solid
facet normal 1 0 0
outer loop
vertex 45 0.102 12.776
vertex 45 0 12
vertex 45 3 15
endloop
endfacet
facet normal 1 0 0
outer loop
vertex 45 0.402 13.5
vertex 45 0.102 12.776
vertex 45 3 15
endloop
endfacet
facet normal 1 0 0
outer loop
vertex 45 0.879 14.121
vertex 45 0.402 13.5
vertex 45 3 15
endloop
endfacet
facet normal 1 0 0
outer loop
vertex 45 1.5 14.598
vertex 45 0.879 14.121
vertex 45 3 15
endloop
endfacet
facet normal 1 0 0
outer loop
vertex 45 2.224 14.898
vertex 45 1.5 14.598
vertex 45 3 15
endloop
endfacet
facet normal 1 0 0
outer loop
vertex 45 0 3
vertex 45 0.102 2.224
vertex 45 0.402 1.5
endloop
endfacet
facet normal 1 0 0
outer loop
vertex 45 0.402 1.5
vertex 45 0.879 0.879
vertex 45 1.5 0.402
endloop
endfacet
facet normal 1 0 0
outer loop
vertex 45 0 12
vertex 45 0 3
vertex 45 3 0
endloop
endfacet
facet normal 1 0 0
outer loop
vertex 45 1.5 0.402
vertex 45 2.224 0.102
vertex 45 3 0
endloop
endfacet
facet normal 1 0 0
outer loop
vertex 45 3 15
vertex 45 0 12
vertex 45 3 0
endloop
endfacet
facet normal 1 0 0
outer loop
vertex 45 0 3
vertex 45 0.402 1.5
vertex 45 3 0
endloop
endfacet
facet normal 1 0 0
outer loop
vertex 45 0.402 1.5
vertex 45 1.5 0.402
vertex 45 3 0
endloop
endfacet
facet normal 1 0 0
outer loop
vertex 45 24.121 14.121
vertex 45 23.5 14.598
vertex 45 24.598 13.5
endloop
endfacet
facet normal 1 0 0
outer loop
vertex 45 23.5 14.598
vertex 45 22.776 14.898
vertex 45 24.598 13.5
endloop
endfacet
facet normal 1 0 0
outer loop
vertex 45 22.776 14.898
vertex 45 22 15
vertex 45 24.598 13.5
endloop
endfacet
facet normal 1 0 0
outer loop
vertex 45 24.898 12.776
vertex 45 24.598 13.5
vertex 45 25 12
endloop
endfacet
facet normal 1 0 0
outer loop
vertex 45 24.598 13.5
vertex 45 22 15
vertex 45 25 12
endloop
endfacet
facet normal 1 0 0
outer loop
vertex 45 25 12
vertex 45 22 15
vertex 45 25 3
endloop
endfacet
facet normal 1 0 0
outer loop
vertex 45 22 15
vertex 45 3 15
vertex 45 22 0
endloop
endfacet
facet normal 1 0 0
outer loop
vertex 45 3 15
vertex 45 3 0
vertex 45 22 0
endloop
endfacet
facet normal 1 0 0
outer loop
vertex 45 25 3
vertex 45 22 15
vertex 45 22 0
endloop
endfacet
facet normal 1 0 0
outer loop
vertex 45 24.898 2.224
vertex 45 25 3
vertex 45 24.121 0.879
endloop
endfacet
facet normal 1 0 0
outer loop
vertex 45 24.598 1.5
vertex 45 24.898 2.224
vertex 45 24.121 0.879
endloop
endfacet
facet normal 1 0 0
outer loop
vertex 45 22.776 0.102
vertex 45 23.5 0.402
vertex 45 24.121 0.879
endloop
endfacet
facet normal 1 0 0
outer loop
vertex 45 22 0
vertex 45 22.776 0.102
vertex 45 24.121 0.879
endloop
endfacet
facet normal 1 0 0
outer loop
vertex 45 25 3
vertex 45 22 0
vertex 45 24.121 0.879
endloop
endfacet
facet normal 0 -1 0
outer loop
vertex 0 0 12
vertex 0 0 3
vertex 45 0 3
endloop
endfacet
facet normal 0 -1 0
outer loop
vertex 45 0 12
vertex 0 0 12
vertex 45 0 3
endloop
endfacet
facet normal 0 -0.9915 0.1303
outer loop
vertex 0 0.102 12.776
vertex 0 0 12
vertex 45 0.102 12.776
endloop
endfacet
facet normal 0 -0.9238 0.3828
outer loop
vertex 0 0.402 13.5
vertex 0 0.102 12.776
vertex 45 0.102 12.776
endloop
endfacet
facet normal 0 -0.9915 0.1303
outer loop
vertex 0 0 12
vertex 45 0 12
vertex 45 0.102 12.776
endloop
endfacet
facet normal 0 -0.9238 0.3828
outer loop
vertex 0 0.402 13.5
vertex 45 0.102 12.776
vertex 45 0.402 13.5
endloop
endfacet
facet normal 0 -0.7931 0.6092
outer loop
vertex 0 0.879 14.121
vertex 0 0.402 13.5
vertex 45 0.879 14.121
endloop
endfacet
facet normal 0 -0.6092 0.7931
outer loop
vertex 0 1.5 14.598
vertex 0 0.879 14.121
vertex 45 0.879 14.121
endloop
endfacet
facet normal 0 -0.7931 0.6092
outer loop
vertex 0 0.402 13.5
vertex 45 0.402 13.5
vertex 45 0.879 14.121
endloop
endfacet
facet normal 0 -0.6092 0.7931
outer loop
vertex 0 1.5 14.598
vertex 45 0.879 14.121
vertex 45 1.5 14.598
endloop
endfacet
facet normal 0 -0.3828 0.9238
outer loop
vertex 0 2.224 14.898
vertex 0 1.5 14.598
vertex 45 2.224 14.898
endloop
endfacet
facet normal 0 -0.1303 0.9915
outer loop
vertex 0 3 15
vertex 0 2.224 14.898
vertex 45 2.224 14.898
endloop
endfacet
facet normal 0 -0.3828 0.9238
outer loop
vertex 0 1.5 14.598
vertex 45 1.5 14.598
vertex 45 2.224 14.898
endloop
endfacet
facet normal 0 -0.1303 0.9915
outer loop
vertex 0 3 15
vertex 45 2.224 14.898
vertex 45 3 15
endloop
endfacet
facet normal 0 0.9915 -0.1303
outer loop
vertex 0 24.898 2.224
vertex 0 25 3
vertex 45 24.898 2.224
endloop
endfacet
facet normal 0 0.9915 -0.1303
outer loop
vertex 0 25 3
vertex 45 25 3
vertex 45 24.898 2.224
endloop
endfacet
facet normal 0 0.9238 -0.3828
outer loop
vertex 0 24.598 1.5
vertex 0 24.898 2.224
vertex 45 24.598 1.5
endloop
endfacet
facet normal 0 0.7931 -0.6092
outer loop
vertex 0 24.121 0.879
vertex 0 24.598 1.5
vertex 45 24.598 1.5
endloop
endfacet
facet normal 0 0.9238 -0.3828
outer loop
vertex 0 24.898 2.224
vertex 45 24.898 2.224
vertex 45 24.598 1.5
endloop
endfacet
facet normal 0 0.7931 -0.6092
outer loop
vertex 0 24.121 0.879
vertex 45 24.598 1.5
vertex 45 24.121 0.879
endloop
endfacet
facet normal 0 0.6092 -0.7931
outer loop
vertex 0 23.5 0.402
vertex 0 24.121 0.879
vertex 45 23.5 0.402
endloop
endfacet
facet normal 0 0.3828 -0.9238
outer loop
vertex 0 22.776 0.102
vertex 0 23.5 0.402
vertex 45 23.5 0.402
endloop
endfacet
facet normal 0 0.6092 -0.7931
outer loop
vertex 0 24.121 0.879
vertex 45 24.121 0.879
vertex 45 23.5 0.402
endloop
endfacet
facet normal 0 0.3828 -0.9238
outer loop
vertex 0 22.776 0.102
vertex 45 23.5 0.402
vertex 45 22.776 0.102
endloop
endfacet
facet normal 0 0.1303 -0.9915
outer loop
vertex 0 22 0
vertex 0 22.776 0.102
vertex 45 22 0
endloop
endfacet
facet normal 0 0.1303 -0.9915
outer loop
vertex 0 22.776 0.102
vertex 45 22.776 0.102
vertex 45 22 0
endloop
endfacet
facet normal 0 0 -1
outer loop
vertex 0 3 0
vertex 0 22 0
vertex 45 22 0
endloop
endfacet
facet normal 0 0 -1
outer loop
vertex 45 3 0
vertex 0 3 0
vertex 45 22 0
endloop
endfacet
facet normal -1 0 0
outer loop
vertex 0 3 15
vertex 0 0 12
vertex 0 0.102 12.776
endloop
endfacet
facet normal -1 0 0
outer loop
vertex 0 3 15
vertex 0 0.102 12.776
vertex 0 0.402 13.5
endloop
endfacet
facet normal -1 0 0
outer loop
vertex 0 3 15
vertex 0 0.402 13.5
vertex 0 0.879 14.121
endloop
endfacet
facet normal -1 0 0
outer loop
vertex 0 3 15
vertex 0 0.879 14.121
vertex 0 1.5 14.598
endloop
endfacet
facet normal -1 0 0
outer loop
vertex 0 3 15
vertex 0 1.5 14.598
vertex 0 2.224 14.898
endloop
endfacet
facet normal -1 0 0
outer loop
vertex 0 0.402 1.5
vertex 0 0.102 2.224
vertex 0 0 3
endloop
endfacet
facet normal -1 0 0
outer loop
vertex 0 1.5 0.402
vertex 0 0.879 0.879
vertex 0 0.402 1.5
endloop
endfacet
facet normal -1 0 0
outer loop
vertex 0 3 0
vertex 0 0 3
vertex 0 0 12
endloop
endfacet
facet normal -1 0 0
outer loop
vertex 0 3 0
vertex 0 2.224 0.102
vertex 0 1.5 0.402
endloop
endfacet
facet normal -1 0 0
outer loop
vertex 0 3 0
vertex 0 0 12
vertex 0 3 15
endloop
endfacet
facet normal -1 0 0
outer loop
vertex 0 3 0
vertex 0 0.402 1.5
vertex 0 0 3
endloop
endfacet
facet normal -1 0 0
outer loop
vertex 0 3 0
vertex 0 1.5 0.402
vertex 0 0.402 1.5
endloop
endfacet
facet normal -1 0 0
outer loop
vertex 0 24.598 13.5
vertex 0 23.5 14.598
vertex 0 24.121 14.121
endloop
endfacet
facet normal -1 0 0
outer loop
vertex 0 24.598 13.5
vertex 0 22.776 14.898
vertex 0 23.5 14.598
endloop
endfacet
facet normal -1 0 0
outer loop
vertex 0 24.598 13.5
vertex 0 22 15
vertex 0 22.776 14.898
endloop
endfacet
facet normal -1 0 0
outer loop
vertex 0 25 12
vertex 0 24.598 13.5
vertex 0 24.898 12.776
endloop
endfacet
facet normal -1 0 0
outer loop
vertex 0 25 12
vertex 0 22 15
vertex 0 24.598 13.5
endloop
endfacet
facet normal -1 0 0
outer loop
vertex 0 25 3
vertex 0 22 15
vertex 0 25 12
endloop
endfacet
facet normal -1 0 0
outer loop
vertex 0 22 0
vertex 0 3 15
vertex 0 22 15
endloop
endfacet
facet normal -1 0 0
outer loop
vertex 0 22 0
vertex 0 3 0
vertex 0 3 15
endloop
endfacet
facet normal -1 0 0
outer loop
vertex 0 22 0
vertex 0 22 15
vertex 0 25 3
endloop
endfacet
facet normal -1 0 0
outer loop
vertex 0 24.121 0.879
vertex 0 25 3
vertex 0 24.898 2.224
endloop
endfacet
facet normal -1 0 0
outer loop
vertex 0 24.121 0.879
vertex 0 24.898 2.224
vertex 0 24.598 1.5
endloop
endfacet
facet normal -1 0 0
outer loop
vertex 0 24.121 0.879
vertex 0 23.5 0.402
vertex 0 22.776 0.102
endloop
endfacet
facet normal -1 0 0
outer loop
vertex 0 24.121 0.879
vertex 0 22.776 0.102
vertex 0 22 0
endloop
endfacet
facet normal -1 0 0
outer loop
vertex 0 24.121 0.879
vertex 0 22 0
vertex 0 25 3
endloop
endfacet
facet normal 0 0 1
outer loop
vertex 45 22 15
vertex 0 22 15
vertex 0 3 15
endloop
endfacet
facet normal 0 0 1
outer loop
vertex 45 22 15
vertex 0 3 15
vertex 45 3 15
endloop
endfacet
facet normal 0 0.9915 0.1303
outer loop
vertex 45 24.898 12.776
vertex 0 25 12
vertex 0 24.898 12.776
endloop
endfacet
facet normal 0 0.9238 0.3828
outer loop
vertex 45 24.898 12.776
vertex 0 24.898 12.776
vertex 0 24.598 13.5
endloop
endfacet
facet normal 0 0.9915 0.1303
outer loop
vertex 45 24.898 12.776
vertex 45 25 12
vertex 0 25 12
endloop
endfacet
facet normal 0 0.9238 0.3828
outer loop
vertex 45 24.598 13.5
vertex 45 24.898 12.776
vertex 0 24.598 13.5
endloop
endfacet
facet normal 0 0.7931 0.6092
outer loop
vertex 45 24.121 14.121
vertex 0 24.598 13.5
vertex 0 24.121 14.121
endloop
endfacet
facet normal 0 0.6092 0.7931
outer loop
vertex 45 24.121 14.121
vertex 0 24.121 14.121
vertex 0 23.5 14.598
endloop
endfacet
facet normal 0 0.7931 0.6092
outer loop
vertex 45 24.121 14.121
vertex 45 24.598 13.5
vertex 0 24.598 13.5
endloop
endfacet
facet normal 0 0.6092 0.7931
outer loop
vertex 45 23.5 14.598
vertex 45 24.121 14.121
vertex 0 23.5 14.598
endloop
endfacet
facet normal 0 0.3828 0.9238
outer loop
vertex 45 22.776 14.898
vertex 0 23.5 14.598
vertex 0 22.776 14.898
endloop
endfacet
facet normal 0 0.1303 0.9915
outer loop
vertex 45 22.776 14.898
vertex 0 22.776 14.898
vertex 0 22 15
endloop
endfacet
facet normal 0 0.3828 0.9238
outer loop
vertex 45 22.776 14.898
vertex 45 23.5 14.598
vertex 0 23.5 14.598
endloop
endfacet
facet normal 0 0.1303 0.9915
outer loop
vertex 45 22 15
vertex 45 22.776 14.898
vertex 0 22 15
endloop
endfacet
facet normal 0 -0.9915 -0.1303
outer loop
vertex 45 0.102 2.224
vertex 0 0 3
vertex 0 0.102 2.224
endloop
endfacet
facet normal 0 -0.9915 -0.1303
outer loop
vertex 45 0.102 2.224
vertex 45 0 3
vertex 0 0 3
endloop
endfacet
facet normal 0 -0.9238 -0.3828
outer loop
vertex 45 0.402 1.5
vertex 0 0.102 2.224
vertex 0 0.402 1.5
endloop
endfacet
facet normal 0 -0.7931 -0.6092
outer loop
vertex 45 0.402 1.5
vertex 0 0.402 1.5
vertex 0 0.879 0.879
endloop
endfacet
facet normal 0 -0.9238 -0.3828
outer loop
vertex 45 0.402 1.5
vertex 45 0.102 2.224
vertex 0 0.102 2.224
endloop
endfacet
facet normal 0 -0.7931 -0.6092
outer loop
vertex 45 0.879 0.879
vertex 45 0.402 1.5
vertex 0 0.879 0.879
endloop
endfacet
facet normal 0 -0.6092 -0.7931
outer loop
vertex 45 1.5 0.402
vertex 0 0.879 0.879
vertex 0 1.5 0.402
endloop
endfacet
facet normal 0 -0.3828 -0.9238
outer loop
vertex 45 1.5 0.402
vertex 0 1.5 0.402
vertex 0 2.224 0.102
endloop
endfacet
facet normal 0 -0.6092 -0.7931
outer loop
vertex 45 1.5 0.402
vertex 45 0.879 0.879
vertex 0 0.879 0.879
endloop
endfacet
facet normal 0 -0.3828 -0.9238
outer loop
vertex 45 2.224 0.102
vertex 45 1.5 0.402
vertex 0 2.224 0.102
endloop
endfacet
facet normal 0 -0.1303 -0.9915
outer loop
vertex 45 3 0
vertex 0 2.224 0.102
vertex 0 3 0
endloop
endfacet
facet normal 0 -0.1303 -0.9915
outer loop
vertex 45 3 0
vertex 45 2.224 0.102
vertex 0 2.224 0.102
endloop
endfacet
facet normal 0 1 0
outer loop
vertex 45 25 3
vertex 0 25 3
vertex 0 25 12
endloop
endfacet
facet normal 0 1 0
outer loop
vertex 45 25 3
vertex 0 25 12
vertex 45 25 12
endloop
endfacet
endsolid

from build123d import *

# Parameters (mm, degrees)
ESBO_O1_W                = 45
ESBO_O1_H                = 25
RESSALTO_EXTRUS_O1_DEPTH = 15
FILETE1_R                = 3


with BuildPart() as part:
    # Esboço1 → Ressalto-extrusão1 (new body)
    with BuildSketch(Plane.XY):
        with Locations((22.5, 12.5)):
            Rectangle(ESBO_O1_W, ESBO_O1_H)
    extrude(amount=RESSALTO_EXTRUS_O1_DEPTH)

    # Filete1
    filete1_edges = [part.edges().sort_by_distance(p)[0] for p in [
        (22.5, 25, 15),
        (22.5, 25, 0),
        (22.5, 0, 0),
        (22.5, 0, 15),
    ]]
    fillet(filete1_edges, radius=FILETE1_R)


solid = part.part
